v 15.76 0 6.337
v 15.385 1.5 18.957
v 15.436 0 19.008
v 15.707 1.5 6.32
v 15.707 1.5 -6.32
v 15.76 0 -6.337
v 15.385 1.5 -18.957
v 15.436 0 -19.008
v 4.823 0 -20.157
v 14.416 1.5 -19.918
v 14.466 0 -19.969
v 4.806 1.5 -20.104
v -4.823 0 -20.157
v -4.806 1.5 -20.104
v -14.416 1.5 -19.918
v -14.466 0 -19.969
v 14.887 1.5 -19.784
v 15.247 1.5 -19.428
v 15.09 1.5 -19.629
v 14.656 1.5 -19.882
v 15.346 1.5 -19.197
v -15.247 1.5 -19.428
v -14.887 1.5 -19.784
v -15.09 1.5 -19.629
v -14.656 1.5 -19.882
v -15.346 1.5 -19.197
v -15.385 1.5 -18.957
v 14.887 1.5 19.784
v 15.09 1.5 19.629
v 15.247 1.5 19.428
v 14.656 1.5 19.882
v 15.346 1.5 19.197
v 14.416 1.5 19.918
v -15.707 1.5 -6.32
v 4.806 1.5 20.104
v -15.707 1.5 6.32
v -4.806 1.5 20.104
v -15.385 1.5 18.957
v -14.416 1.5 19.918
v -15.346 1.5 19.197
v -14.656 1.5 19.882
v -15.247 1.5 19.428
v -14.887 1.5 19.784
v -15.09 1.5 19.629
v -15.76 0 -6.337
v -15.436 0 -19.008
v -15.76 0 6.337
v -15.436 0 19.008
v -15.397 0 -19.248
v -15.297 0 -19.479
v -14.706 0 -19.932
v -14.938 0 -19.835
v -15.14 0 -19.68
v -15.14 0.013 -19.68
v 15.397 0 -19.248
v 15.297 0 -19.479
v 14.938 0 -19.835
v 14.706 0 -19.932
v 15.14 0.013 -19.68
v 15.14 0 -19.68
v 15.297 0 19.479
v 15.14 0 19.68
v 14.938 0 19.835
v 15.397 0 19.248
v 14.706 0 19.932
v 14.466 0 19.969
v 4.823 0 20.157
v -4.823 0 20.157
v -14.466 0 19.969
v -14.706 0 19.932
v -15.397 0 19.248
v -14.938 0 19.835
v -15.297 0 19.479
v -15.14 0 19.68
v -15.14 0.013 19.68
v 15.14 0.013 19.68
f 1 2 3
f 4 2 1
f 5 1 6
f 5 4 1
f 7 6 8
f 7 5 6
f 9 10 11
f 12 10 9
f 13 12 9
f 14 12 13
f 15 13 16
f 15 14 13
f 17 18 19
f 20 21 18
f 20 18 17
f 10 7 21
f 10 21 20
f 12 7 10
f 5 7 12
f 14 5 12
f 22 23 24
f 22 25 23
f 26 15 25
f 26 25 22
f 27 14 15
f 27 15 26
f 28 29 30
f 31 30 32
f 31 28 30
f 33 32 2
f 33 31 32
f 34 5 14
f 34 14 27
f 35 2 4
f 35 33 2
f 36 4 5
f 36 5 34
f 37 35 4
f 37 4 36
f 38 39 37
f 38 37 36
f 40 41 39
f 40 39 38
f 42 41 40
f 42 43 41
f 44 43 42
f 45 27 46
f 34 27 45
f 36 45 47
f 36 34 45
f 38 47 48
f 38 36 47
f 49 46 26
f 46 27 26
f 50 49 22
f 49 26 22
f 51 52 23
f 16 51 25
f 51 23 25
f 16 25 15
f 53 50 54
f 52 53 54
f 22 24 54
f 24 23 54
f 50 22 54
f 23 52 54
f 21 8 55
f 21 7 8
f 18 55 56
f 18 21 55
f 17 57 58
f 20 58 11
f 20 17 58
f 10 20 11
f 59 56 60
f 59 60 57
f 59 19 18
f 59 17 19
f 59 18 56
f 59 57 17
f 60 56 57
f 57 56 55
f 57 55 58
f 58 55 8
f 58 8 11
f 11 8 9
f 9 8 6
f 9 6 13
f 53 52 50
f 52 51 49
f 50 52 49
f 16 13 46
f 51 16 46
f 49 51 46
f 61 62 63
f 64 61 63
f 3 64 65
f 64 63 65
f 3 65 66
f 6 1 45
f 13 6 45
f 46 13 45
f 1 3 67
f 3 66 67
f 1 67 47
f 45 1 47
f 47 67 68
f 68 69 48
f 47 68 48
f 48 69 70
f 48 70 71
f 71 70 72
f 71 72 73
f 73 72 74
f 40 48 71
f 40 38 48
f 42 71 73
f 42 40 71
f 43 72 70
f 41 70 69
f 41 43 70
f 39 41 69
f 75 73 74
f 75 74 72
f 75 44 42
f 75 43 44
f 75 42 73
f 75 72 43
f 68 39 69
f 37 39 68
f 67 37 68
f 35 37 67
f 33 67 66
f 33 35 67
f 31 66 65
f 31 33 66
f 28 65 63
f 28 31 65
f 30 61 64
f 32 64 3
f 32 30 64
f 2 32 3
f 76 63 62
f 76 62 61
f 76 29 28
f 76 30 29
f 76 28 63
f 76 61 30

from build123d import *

# Parameters (mm, degrees)
BOSS_EXTRUDE1_DEPTH = 1.5
BOSS_EXTRUDE1_TAPER = 2
FILLET1_R           = 1


with BuildPart() as part:
    # Sketch1 → Boss-Extrude1 (new body)
    with BuildSketch(Plane(origin=(0, 0, 0), x_dir=(1, 0, 0), z_dir=(0, 1, 0))):
        with BuildLine():
            ThreePointArc((-15.398991588, 19.940901099), (-15.8, 0), (-15.398991588, -19.940901099))
            ThreePointArc((-15.398991588, -19.940901099), (0, -20.18), (15.398991588, -19.940901099))
            ThreePointArc((15.398991588, -19.940901099), (15.8, 0), (15.398991588, 19.940901099))
            ThreePointArc((15.398991588, 19.940901099), (0, 20.18), (-15.398991588, 19.940901099))
        make_face()
    extrude(amount=BOSS_EXTRUDE1_DEPTH, taper=BOSS_EXTRUDE1_TAPER)

    # Fillet1
    fillet1_edges = [part.edges().sort_by_distance(p)[0] for p in [
        (15.373801496, 0.75, -19.915479128),
        (15.373801497, 0.75, 19.915479128),
        (-15.373801496, 0.75, 19.915479128),
        (-15.373801496, 0.75, -19.915479128),
    ]]
    fillet(fillet1_edges, radius=FILLET1_R)


solid = part.part
